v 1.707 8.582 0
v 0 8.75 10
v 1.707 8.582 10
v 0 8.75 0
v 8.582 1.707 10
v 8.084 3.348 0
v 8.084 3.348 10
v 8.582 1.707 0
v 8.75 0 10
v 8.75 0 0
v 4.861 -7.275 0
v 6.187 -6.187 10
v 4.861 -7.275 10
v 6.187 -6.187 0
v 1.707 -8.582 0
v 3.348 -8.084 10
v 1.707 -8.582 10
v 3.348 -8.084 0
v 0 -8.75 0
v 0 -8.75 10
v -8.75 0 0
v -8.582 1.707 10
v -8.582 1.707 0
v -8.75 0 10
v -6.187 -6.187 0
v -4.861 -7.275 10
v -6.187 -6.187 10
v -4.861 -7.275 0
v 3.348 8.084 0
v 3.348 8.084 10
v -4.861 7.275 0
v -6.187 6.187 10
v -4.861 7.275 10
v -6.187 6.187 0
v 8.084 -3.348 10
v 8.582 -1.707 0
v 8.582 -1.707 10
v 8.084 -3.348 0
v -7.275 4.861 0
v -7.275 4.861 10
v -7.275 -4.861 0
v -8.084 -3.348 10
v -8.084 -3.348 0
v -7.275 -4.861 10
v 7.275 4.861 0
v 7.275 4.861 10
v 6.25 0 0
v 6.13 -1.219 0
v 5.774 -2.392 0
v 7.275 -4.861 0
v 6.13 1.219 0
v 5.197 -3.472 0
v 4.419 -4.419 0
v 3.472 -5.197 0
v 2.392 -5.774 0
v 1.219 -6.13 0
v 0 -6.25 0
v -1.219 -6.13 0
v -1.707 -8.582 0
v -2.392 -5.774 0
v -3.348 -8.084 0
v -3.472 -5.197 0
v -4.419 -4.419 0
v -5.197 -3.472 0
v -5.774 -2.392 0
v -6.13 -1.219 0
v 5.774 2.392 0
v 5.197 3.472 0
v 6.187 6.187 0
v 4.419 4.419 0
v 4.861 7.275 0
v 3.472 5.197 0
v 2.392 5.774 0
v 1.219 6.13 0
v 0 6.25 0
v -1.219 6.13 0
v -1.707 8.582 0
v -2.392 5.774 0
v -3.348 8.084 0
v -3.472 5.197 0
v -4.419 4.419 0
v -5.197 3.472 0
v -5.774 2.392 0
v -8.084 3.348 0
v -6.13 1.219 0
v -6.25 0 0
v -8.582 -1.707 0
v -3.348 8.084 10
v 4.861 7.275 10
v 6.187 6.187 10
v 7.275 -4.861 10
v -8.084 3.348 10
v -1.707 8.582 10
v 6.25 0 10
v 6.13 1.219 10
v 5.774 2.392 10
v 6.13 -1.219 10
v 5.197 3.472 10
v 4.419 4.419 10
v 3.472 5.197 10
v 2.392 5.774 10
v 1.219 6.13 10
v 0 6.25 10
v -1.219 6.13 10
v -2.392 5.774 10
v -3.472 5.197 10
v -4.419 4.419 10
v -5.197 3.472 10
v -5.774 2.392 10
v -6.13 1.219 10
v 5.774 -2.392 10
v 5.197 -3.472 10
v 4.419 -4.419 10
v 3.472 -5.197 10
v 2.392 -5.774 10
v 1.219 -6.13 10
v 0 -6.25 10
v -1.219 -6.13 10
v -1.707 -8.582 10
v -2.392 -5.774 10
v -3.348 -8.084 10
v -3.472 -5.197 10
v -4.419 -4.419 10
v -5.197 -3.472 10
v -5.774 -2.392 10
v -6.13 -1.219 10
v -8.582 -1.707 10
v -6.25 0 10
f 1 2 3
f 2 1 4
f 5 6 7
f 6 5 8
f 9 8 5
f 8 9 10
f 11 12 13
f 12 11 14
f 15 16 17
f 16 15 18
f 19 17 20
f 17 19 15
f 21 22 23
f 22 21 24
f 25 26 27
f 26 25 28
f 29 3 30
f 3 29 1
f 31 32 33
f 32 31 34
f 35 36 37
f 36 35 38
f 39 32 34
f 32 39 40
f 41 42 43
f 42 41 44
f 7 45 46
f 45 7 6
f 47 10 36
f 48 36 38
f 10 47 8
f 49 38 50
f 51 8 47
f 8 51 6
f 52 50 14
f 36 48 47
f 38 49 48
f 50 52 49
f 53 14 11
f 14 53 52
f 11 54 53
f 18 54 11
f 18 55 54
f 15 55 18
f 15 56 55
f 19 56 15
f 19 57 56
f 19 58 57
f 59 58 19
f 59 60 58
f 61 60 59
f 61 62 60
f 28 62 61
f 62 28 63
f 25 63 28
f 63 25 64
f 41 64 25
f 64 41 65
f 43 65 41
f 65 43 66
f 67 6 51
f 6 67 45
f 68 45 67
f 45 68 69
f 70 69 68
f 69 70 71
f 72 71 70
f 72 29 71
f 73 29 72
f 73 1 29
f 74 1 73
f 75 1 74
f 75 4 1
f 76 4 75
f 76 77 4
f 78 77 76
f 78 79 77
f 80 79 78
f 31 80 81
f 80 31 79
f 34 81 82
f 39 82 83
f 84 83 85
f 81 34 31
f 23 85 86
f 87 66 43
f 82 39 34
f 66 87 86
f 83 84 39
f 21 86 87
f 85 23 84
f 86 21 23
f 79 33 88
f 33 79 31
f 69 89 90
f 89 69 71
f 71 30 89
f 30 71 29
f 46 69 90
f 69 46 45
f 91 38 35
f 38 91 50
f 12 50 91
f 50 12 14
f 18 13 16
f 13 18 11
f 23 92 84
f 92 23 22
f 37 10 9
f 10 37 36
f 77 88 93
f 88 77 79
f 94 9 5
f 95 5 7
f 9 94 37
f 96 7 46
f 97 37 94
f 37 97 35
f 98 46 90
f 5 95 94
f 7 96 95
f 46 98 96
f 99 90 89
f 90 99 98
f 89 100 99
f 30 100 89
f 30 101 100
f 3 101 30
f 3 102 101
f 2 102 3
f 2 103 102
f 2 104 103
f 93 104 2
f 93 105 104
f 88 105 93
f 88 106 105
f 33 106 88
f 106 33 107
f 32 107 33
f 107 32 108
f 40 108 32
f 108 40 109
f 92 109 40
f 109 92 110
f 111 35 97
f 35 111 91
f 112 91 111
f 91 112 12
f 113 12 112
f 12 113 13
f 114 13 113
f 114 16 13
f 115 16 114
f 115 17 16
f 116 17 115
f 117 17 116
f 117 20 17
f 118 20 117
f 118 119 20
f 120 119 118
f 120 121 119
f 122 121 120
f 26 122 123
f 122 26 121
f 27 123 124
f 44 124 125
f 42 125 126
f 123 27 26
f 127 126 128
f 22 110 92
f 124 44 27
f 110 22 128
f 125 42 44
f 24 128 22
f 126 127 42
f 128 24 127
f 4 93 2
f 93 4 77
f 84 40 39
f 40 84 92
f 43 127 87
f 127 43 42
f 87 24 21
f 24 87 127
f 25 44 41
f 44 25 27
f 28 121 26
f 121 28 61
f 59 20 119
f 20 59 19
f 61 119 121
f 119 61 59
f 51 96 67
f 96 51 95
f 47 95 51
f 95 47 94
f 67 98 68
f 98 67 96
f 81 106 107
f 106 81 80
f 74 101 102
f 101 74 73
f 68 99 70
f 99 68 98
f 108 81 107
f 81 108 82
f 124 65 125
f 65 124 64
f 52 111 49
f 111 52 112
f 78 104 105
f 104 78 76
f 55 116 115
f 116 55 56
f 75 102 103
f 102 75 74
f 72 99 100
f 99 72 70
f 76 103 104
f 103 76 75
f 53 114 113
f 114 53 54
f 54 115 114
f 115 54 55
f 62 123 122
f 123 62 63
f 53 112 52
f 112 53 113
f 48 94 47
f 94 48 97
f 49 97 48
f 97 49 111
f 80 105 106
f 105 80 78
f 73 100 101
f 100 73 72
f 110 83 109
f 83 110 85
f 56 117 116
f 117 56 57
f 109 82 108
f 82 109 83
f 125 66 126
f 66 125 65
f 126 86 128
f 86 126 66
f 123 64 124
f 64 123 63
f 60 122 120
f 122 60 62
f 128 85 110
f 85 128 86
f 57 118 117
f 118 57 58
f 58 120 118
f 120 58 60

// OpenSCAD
$fn = 32;
// ----------------------------------------------------------------------
// Spacer sleeve: 17.5 / 12.5 x 10 mm
// ----------------------------------------------------------------------

// --- parameters (mm) ---
outer_d = 17.5;           // outside diameter
inner_d = 12.5;           // shaft bore
length = 10;              // sleeve length

module sleeve() {
  cylinder(h = length, d = outer_d);
}

difference() {
  sleeve();
  translate([0, 0, -1]) cylinder(h = length + 2, d = inner_d);
}
